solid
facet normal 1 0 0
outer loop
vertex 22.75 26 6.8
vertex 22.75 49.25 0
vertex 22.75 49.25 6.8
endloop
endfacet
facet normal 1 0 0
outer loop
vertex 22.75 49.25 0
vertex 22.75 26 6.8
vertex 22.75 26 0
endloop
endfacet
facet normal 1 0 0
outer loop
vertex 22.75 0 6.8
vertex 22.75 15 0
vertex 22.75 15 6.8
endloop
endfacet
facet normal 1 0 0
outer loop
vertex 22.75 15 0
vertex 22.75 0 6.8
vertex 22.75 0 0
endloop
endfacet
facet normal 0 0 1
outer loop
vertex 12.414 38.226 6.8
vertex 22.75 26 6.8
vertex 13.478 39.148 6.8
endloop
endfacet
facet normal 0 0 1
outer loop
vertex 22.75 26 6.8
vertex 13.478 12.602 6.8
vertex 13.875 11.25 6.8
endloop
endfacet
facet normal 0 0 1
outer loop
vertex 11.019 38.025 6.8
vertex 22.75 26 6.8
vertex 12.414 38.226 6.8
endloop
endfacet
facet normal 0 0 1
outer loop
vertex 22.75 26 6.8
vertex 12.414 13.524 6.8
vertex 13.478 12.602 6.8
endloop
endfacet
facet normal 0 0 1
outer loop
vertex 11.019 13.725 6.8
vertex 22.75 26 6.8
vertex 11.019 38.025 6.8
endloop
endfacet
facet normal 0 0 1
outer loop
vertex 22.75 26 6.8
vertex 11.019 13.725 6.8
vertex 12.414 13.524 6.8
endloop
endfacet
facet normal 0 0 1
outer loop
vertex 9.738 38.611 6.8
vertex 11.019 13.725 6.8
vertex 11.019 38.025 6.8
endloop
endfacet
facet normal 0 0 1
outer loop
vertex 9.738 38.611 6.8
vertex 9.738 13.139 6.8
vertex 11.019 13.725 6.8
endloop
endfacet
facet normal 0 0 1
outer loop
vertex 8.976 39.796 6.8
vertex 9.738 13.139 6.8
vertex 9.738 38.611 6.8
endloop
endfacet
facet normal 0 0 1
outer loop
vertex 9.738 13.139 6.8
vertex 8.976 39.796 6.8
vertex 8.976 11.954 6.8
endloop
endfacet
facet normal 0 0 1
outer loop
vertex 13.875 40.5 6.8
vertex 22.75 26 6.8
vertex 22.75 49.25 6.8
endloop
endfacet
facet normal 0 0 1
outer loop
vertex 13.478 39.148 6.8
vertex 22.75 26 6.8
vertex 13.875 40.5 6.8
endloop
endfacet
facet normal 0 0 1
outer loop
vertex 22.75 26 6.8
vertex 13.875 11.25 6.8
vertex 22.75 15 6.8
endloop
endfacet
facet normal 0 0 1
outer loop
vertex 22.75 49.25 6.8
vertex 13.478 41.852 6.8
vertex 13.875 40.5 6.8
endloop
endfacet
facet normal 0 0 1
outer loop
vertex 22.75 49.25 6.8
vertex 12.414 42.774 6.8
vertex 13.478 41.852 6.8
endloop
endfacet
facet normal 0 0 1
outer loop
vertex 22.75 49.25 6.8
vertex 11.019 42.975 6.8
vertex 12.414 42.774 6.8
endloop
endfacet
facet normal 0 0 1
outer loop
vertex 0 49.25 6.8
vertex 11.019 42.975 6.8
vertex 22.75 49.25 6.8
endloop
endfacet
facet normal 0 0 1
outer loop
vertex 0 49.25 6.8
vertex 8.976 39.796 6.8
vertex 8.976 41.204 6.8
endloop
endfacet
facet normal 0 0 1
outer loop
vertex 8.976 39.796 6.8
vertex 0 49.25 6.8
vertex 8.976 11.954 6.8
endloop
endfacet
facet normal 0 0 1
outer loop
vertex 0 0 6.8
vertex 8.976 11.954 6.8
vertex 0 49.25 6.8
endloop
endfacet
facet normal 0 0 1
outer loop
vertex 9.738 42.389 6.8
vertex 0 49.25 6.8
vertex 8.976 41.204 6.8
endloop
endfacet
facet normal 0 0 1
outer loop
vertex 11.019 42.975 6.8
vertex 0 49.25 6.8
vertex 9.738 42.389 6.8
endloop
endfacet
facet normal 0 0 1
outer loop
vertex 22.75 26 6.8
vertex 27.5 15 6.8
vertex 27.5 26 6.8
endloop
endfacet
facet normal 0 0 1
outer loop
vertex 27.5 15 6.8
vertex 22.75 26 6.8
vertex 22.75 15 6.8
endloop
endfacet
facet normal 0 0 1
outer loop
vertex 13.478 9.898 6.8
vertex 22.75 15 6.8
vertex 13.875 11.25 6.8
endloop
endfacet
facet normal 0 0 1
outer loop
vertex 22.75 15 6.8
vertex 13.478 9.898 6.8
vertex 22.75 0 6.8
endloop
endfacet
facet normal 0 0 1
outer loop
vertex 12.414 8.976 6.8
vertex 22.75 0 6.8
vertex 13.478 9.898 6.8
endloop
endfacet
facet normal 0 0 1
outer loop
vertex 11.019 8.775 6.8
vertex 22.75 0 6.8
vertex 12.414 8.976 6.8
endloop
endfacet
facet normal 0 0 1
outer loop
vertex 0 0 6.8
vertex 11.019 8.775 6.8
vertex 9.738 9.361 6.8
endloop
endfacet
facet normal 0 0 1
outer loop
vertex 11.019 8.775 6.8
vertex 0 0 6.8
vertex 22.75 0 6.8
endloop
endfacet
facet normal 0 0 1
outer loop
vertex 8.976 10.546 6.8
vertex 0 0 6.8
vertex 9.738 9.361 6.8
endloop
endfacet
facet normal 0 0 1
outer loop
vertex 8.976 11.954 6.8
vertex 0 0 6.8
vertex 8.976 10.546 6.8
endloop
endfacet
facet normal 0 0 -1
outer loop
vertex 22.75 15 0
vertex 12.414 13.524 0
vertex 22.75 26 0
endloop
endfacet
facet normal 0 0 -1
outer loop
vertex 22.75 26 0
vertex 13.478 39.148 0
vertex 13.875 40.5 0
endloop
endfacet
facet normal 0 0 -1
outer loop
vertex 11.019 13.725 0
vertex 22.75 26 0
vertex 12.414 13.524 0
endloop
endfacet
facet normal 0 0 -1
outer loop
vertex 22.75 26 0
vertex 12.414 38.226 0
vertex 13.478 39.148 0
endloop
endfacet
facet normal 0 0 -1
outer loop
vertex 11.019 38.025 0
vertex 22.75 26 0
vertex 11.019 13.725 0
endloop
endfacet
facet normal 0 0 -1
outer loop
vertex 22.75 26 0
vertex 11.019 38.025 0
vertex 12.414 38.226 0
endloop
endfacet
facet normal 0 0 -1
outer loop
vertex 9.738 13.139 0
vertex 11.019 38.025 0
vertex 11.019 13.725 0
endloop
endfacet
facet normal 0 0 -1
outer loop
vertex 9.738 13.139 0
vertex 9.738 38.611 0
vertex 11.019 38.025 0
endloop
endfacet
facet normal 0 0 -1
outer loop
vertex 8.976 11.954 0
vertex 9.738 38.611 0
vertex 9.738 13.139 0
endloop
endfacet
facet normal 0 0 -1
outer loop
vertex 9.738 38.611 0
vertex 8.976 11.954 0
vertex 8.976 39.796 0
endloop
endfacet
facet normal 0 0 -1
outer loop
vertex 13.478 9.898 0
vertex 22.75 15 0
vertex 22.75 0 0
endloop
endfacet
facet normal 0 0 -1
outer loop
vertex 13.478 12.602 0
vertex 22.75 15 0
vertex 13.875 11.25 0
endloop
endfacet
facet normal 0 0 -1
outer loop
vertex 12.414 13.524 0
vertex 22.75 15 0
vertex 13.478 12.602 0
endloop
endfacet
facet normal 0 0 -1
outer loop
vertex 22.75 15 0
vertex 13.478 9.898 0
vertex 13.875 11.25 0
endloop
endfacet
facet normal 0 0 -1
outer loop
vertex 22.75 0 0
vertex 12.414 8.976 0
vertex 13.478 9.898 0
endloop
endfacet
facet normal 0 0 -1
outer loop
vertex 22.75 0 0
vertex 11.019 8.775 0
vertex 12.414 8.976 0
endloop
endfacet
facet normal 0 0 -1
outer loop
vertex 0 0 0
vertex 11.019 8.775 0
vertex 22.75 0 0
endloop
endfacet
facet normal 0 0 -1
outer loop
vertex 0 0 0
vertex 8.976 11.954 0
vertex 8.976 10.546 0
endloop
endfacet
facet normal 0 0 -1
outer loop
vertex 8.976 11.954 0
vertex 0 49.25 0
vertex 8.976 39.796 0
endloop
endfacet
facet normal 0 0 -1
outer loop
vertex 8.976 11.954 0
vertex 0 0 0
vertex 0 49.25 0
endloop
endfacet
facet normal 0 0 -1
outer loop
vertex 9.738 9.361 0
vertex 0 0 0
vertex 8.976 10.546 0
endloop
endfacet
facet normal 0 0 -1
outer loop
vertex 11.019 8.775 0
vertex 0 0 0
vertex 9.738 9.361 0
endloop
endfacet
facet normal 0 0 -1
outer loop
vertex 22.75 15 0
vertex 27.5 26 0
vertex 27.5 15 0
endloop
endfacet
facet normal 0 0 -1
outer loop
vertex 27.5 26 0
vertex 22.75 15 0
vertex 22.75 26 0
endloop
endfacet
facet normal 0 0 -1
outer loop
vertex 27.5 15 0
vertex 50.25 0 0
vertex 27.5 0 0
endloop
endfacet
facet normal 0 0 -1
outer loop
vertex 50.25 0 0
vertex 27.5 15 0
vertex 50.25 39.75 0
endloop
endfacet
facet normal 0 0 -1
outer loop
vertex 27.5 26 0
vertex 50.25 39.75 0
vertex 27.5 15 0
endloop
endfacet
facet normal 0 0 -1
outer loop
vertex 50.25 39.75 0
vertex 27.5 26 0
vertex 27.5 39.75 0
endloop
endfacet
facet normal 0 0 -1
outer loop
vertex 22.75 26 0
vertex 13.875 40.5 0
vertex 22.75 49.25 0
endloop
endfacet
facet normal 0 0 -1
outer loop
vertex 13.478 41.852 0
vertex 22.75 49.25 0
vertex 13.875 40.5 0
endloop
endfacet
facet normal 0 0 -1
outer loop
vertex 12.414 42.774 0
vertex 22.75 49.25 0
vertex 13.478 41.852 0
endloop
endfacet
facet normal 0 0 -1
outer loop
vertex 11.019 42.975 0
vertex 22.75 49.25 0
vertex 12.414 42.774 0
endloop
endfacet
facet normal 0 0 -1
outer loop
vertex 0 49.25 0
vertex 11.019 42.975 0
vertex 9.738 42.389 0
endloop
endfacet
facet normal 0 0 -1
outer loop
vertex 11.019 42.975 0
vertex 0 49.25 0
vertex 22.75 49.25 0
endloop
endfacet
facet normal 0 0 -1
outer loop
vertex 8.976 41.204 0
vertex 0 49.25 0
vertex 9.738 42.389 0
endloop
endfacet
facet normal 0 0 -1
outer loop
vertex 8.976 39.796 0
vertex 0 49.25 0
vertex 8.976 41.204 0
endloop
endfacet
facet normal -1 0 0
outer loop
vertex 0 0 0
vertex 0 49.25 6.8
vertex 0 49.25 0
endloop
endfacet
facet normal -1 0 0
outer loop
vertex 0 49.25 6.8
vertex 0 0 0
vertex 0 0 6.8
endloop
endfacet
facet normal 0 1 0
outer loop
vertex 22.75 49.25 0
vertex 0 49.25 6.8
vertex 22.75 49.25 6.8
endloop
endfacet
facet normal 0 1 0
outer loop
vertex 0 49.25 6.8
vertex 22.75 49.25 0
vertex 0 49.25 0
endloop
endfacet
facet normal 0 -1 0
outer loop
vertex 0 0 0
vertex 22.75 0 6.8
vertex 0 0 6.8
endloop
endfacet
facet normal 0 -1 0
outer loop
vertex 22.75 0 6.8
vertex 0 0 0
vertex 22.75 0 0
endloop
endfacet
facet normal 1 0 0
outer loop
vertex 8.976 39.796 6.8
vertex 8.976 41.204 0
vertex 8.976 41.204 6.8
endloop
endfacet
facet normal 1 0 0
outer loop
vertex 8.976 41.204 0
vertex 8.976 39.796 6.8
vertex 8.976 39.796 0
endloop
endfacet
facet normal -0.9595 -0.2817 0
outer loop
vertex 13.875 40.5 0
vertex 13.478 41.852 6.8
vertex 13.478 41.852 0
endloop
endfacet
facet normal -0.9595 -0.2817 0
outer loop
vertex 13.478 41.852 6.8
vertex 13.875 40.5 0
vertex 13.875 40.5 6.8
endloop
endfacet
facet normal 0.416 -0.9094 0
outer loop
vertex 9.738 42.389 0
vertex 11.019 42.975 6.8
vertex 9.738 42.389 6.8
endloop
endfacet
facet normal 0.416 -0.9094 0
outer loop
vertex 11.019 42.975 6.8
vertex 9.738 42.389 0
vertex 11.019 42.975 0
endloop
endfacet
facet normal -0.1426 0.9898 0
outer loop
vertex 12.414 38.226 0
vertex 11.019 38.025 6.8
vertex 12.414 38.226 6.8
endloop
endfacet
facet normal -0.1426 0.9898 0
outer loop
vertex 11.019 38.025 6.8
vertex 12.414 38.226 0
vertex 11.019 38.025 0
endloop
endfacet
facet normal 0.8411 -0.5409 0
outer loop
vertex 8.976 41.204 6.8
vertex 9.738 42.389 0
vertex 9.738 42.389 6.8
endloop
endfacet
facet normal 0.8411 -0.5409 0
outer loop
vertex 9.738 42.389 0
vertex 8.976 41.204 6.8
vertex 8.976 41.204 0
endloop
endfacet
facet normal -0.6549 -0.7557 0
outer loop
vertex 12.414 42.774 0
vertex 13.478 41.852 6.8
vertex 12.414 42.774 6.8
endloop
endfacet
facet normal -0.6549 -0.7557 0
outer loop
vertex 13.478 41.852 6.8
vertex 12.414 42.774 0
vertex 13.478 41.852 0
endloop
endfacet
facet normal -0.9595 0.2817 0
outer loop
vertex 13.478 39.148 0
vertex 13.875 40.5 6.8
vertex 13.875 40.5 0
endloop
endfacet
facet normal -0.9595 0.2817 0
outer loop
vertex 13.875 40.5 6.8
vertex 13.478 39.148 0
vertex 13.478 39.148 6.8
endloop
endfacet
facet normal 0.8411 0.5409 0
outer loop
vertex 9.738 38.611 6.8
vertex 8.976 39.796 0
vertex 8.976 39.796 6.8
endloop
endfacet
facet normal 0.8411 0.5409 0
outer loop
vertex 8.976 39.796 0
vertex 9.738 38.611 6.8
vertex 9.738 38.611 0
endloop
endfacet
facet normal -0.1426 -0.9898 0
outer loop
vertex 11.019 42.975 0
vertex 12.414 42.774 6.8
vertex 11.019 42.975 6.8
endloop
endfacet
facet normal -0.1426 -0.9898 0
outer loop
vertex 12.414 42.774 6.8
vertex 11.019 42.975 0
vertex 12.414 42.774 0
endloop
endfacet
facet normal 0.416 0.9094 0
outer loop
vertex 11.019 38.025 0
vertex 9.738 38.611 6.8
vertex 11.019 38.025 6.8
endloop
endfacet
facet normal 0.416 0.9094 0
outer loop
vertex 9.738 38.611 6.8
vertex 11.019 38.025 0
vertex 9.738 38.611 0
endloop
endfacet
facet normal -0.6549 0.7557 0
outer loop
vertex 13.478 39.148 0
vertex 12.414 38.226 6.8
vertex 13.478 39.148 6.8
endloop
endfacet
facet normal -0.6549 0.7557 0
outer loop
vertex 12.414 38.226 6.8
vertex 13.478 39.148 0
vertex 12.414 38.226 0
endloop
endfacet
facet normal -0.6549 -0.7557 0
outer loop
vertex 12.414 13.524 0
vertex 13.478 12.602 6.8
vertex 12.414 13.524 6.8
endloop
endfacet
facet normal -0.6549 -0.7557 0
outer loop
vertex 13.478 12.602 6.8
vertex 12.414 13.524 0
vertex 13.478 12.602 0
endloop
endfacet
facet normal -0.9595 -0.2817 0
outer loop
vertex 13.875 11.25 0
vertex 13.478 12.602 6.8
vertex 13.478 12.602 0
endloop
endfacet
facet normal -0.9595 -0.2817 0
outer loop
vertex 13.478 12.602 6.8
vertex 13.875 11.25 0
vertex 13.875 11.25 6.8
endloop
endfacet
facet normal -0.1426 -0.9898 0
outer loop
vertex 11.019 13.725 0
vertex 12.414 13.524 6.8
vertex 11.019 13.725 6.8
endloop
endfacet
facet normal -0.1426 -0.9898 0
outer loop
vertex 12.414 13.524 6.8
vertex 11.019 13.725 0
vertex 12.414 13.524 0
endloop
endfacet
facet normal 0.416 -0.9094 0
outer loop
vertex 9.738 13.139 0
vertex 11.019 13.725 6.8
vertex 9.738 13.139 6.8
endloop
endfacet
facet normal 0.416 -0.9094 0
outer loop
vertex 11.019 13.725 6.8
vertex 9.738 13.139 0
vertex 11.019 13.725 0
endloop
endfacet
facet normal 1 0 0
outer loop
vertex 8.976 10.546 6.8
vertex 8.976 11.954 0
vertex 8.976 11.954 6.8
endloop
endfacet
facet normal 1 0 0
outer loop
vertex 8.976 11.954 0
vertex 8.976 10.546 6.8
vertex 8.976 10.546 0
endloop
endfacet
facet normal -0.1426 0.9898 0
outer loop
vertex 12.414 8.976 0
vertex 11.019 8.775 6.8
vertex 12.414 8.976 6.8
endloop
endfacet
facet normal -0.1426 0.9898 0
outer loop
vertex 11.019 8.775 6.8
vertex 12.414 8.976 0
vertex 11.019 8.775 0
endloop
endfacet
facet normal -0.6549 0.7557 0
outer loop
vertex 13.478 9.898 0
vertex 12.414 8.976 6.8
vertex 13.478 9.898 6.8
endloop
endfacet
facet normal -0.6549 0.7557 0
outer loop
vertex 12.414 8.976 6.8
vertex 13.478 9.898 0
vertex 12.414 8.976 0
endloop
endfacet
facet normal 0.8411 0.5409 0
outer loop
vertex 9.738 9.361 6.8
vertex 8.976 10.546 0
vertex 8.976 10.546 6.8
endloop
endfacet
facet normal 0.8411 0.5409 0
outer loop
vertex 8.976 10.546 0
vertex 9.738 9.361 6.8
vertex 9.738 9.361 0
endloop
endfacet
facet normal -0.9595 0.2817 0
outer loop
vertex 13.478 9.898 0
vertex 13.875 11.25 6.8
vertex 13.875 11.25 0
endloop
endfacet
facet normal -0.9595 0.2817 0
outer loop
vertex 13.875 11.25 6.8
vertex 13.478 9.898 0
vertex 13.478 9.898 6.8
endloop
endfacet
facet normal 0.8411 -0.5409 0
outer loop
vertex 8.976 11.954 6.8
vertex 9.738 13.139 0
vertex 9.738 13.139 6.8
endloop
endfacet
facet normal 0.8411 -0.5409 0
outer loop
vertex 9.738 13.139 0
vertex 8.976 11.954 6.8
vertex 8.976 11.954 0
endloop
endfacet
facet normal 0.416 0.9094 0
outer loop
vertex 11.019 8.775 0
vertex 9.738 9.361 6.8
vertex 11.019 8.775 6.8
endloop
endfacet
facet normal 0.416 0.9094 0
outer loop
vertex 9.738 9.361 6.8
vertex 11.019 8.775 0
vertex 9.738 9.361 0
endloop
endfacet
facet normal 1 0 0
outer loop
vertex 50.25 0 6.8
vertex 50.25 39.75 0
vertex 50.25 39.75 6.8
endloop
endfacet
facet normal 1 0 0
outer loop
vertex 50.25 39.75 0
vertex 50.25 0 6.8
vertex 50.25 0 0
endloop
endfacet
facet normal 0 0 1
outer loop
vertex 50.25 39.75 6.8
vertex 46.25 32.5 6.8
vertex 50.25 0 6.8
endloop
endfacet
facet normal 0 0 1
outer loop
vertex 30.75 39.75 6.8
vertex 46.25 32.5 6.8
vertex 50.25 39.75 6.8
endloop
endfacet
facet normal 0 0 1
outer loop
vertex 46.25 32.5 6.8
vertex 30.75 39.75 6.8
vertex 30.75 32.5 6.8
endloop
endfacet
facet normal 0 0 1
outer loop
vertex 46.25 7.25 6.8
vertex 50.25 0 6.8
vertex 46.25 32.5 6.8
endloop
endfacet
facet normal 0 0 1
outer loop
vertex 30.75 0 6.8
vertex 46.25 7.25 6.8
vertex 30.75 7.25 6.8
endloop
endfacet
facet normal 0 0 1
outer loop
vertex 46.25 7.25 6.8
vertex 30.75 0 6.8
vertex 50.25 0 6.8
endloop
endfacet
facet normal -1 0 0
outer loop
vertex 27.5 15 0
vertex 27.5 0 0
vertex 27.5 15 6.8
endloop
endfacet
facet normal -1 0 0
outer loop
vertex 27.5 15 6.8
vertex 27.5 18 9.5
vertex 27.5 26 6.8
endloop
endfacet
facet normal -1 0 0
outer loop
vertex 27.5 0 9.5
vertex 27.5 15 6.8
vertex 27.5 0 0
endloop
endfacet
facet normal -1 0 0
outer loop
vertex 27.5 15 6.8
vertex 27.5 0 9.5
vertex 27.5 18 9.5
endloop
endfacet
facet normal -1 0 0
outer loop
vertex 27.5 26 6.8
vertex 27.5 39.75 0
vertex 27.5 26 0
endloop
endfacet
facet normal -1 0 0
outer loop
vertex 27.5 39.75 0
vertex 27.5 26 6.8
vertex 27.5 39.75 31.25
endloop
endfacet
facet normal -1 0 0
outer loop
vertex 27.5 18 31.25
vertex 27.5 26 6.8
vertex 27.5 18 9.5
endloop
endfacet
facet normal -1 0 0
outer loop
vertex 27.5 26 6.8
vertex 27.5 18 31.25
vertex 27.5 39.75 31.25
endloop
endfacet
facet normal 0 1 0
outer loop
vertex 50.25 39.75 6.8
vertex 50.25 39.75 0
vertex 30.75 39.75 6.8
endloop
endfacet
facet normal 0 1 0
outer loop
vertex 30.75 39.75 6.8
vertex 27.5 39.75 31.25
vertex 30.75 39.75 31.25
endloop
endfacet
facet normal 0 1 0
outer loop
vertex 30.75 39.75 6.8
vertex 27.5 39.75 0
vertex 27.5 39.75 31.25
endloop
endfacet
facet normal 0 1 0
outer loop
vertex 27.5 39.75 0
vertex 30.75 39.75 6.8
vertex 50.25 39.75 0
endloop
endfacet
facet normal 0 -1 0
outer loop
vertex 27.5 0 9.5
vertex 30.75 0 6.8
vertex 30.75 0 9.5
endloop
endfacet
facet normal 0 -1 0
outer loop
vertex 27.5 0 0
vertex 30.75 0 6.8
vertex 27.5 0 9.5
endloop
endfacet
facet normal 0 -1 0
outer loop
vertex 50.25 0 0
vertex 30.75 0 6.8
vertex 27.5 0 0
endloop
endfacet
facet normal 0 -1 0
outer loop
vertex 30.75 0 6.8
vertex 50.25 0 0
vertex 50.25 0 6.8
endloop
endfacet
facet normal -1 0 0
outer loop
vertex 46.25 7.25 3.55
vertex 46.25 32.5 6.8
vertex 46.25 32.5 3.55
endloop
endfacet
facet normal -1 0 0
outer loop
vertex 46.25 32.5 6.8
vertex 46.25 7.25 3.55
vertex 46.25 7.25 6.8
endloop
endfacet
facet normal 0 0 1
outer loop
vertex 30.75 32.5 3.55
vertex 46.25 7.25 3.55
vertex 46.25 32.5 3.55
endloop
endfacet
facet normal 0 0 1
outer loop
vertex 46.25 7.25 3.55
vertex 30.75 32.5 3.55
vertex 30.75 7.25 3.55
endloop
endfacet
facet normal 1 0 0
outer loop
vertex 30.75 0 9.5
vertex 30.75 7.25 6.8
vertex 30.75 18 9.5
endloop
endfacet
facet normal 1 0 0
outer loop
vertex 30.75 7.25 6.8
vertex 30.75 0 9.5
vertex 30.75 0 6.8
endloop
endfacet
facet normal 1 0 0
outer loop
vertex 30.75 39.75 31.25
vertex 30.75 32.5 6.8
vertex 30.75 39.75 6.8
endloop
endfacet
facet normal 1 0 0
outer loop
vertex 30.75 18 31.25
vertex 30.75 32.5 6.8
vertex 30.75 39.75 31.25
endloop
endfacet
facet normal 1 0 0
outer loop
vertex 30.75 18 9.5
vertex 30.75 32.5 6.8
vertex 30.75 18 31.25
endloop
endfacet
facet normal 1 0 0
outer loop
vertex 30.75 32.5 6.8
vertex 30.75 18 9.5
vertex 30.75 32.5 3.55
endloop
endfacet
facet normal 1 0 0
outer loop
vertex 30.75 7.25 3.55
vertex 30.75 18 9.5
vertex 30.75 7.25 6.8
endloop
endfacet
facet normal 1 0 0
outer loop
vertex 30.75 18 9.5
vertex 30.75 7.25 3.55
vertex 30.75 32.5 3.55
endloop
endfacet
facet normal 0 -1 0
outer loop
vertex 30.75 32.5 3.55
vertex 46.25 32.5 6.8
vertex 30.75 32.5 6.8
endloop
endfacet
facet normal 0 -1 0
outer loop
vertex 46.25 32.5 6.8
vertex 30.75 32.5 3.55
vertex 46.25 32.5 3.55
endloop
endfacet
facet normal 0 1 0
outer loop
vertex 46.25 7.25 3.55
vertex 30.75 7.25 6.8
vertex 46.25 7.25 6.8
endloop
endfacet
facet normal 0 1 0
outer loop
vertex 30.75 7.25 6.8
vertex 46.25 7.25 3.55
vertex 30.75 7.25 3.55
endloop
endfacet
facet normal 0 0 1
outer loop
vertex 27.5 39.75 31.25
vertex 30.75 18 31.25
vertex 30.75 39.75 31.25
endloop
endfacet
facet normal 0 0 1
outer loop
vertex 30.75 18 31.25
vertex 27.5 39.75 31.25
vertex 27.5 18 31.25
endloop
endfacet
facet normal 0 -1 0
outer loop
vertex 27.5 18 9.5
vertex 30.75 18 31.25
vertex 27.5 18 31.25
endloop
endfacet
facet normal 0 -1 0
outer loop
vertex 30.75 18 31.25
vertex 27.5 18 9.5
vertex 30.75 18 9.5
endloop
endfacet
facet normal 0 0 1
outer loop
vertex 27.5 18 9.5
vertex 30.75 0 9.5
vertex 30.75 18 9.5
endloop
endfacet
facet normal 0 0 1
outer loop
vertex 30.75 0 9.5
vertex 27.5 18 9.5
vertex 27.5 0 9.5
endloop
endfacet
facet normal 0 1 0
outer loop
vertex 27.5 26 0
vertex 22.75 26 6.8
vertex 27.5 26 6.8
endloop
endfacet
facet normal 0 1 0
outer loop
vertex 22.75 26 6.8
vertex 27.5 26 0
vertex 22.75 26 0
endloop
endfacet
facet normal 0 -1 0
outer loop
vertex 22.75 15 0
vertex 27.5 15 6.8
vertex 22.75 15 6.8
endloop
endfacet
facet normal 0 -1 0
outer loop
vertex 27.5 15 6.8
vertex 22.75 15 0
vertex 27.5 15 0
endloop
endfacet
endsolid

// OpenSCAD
/*

                +-+
                | |
                | | Latch
                | |                                             +---+
                | |                                           |--|  |
+----------     +-+-+-----------+                      Latch  +--+  |
|         |     |   |           |                                |  |
|   +--+  |     |   +---------+ |                                |  |
|   |  |  |     |   |         | |                                |  |  Clip
|   +--+  ++    | C |         | |                              +-+  |
|          |    | l |         | |  w                           | |  |
|          |    | i |         | |  i                           | |  |    |
|          +----+ p |         | |  d                           | |  |  31.25
|  Screw   |    |   |         | |  t                           | |  |    |
|  base    |    |   |         | |  h                           +-+  |
|          |    |   | Lever   | |                                |  |
|   +--+   |    |   |         | |                                |  |
|   |  |   +----+   |         | |                                |  |
|   +--+   |    |   |         | |          +-----------------+   |  +---------------+
|          |    |   +---------+ |          |                 +---+  |               |
|          |    |   |           |          | Screw base      +---+  |  Lever        |
+----------+    +---+-----------+          +-----------------+   +--+---------------+
                      outcrop                                          - 22.75 -
        Top View                                          Side View

(made using http://asciiflow.com/)
*/

$fa=1;
$fs=1.5;

clip_height = 31.25;
clip_width = 21.75;
clip_thickness = 3.25;
clip_inset = 18;
lever_outcrop = 22.75;
lever_width = 39.75;
lever_height = 6.8;
screwbase_outcrop = 22.75; // TODO: Need to measure
screwbase_width = 49.25;
screwbase_height = 6.8; // TODO: Need to measure
connector_length = 4.75;
connector_width = 11;
connector_height = 6.8; // TODO: Need to measure
connector_inset = 15;
screw_hole_diameter = 5;
screw_hole_radius = screw_hole_diameter / 2;

screwbase();

translate([screwbase_outcrop, connector_inset, 0 ])
  connector();

clip_offset_x = screwbase_outcrop + connector_length;

translate([clip_offset_x, 0, 0])
  cliplever();

module screwbase() {
  difference(){
    cube([
      screwbase_outcrop,
      screwbase_width,
      screwbase_height,
    ]);

    screw_hole_center = screwbase_outcrop / 2;

    translate([
      screw_hole_center,
      screwbase_width - 6.25 - screw_hole_radius,
      -1
    ])
      screw_hole();

    translate([
      screw_hole_center,
      8.75 + screw_hole_radius,
      -1
    ])
      screw_hole();
  }
}

module connector(){
  cube([
    connector_length,
    connector_width,
    connector_height
  ]);
}

module cliplever(){
  // vertical clip
  translate([0, clip_inset, 0])
  cube([
    clip_thickness,
    clip_width,
    clip_height
  ]);

  // base lever
  difference(){
    cube([
      lever_outcrop,
      lever_width,
      lever_height
    ]);
    lever_depression();
  }


  // lever lip
  clip_lip_height = 9.5;
  cube([
    clip_thickness,
    lever_width,
    clip_lip_height
  ]);

}

module lever_depression(){
  // lever depression
  depression_inset = 7.25;
  depression_depth = 3.25;
  color([1,0,0])
  translate([
    clip_thickness,
    depression_inset,
    lever_height - depression_depth
  ])
    cube([
      lever_outcrop - depression_inset,
      lever_width - (2 * depression_inset),
      depression_depth + 0.1
    ]);

}

module screw_hole(){
  cylinder(r=screw_hole_radius, h=screwbase_height * 2);
}
